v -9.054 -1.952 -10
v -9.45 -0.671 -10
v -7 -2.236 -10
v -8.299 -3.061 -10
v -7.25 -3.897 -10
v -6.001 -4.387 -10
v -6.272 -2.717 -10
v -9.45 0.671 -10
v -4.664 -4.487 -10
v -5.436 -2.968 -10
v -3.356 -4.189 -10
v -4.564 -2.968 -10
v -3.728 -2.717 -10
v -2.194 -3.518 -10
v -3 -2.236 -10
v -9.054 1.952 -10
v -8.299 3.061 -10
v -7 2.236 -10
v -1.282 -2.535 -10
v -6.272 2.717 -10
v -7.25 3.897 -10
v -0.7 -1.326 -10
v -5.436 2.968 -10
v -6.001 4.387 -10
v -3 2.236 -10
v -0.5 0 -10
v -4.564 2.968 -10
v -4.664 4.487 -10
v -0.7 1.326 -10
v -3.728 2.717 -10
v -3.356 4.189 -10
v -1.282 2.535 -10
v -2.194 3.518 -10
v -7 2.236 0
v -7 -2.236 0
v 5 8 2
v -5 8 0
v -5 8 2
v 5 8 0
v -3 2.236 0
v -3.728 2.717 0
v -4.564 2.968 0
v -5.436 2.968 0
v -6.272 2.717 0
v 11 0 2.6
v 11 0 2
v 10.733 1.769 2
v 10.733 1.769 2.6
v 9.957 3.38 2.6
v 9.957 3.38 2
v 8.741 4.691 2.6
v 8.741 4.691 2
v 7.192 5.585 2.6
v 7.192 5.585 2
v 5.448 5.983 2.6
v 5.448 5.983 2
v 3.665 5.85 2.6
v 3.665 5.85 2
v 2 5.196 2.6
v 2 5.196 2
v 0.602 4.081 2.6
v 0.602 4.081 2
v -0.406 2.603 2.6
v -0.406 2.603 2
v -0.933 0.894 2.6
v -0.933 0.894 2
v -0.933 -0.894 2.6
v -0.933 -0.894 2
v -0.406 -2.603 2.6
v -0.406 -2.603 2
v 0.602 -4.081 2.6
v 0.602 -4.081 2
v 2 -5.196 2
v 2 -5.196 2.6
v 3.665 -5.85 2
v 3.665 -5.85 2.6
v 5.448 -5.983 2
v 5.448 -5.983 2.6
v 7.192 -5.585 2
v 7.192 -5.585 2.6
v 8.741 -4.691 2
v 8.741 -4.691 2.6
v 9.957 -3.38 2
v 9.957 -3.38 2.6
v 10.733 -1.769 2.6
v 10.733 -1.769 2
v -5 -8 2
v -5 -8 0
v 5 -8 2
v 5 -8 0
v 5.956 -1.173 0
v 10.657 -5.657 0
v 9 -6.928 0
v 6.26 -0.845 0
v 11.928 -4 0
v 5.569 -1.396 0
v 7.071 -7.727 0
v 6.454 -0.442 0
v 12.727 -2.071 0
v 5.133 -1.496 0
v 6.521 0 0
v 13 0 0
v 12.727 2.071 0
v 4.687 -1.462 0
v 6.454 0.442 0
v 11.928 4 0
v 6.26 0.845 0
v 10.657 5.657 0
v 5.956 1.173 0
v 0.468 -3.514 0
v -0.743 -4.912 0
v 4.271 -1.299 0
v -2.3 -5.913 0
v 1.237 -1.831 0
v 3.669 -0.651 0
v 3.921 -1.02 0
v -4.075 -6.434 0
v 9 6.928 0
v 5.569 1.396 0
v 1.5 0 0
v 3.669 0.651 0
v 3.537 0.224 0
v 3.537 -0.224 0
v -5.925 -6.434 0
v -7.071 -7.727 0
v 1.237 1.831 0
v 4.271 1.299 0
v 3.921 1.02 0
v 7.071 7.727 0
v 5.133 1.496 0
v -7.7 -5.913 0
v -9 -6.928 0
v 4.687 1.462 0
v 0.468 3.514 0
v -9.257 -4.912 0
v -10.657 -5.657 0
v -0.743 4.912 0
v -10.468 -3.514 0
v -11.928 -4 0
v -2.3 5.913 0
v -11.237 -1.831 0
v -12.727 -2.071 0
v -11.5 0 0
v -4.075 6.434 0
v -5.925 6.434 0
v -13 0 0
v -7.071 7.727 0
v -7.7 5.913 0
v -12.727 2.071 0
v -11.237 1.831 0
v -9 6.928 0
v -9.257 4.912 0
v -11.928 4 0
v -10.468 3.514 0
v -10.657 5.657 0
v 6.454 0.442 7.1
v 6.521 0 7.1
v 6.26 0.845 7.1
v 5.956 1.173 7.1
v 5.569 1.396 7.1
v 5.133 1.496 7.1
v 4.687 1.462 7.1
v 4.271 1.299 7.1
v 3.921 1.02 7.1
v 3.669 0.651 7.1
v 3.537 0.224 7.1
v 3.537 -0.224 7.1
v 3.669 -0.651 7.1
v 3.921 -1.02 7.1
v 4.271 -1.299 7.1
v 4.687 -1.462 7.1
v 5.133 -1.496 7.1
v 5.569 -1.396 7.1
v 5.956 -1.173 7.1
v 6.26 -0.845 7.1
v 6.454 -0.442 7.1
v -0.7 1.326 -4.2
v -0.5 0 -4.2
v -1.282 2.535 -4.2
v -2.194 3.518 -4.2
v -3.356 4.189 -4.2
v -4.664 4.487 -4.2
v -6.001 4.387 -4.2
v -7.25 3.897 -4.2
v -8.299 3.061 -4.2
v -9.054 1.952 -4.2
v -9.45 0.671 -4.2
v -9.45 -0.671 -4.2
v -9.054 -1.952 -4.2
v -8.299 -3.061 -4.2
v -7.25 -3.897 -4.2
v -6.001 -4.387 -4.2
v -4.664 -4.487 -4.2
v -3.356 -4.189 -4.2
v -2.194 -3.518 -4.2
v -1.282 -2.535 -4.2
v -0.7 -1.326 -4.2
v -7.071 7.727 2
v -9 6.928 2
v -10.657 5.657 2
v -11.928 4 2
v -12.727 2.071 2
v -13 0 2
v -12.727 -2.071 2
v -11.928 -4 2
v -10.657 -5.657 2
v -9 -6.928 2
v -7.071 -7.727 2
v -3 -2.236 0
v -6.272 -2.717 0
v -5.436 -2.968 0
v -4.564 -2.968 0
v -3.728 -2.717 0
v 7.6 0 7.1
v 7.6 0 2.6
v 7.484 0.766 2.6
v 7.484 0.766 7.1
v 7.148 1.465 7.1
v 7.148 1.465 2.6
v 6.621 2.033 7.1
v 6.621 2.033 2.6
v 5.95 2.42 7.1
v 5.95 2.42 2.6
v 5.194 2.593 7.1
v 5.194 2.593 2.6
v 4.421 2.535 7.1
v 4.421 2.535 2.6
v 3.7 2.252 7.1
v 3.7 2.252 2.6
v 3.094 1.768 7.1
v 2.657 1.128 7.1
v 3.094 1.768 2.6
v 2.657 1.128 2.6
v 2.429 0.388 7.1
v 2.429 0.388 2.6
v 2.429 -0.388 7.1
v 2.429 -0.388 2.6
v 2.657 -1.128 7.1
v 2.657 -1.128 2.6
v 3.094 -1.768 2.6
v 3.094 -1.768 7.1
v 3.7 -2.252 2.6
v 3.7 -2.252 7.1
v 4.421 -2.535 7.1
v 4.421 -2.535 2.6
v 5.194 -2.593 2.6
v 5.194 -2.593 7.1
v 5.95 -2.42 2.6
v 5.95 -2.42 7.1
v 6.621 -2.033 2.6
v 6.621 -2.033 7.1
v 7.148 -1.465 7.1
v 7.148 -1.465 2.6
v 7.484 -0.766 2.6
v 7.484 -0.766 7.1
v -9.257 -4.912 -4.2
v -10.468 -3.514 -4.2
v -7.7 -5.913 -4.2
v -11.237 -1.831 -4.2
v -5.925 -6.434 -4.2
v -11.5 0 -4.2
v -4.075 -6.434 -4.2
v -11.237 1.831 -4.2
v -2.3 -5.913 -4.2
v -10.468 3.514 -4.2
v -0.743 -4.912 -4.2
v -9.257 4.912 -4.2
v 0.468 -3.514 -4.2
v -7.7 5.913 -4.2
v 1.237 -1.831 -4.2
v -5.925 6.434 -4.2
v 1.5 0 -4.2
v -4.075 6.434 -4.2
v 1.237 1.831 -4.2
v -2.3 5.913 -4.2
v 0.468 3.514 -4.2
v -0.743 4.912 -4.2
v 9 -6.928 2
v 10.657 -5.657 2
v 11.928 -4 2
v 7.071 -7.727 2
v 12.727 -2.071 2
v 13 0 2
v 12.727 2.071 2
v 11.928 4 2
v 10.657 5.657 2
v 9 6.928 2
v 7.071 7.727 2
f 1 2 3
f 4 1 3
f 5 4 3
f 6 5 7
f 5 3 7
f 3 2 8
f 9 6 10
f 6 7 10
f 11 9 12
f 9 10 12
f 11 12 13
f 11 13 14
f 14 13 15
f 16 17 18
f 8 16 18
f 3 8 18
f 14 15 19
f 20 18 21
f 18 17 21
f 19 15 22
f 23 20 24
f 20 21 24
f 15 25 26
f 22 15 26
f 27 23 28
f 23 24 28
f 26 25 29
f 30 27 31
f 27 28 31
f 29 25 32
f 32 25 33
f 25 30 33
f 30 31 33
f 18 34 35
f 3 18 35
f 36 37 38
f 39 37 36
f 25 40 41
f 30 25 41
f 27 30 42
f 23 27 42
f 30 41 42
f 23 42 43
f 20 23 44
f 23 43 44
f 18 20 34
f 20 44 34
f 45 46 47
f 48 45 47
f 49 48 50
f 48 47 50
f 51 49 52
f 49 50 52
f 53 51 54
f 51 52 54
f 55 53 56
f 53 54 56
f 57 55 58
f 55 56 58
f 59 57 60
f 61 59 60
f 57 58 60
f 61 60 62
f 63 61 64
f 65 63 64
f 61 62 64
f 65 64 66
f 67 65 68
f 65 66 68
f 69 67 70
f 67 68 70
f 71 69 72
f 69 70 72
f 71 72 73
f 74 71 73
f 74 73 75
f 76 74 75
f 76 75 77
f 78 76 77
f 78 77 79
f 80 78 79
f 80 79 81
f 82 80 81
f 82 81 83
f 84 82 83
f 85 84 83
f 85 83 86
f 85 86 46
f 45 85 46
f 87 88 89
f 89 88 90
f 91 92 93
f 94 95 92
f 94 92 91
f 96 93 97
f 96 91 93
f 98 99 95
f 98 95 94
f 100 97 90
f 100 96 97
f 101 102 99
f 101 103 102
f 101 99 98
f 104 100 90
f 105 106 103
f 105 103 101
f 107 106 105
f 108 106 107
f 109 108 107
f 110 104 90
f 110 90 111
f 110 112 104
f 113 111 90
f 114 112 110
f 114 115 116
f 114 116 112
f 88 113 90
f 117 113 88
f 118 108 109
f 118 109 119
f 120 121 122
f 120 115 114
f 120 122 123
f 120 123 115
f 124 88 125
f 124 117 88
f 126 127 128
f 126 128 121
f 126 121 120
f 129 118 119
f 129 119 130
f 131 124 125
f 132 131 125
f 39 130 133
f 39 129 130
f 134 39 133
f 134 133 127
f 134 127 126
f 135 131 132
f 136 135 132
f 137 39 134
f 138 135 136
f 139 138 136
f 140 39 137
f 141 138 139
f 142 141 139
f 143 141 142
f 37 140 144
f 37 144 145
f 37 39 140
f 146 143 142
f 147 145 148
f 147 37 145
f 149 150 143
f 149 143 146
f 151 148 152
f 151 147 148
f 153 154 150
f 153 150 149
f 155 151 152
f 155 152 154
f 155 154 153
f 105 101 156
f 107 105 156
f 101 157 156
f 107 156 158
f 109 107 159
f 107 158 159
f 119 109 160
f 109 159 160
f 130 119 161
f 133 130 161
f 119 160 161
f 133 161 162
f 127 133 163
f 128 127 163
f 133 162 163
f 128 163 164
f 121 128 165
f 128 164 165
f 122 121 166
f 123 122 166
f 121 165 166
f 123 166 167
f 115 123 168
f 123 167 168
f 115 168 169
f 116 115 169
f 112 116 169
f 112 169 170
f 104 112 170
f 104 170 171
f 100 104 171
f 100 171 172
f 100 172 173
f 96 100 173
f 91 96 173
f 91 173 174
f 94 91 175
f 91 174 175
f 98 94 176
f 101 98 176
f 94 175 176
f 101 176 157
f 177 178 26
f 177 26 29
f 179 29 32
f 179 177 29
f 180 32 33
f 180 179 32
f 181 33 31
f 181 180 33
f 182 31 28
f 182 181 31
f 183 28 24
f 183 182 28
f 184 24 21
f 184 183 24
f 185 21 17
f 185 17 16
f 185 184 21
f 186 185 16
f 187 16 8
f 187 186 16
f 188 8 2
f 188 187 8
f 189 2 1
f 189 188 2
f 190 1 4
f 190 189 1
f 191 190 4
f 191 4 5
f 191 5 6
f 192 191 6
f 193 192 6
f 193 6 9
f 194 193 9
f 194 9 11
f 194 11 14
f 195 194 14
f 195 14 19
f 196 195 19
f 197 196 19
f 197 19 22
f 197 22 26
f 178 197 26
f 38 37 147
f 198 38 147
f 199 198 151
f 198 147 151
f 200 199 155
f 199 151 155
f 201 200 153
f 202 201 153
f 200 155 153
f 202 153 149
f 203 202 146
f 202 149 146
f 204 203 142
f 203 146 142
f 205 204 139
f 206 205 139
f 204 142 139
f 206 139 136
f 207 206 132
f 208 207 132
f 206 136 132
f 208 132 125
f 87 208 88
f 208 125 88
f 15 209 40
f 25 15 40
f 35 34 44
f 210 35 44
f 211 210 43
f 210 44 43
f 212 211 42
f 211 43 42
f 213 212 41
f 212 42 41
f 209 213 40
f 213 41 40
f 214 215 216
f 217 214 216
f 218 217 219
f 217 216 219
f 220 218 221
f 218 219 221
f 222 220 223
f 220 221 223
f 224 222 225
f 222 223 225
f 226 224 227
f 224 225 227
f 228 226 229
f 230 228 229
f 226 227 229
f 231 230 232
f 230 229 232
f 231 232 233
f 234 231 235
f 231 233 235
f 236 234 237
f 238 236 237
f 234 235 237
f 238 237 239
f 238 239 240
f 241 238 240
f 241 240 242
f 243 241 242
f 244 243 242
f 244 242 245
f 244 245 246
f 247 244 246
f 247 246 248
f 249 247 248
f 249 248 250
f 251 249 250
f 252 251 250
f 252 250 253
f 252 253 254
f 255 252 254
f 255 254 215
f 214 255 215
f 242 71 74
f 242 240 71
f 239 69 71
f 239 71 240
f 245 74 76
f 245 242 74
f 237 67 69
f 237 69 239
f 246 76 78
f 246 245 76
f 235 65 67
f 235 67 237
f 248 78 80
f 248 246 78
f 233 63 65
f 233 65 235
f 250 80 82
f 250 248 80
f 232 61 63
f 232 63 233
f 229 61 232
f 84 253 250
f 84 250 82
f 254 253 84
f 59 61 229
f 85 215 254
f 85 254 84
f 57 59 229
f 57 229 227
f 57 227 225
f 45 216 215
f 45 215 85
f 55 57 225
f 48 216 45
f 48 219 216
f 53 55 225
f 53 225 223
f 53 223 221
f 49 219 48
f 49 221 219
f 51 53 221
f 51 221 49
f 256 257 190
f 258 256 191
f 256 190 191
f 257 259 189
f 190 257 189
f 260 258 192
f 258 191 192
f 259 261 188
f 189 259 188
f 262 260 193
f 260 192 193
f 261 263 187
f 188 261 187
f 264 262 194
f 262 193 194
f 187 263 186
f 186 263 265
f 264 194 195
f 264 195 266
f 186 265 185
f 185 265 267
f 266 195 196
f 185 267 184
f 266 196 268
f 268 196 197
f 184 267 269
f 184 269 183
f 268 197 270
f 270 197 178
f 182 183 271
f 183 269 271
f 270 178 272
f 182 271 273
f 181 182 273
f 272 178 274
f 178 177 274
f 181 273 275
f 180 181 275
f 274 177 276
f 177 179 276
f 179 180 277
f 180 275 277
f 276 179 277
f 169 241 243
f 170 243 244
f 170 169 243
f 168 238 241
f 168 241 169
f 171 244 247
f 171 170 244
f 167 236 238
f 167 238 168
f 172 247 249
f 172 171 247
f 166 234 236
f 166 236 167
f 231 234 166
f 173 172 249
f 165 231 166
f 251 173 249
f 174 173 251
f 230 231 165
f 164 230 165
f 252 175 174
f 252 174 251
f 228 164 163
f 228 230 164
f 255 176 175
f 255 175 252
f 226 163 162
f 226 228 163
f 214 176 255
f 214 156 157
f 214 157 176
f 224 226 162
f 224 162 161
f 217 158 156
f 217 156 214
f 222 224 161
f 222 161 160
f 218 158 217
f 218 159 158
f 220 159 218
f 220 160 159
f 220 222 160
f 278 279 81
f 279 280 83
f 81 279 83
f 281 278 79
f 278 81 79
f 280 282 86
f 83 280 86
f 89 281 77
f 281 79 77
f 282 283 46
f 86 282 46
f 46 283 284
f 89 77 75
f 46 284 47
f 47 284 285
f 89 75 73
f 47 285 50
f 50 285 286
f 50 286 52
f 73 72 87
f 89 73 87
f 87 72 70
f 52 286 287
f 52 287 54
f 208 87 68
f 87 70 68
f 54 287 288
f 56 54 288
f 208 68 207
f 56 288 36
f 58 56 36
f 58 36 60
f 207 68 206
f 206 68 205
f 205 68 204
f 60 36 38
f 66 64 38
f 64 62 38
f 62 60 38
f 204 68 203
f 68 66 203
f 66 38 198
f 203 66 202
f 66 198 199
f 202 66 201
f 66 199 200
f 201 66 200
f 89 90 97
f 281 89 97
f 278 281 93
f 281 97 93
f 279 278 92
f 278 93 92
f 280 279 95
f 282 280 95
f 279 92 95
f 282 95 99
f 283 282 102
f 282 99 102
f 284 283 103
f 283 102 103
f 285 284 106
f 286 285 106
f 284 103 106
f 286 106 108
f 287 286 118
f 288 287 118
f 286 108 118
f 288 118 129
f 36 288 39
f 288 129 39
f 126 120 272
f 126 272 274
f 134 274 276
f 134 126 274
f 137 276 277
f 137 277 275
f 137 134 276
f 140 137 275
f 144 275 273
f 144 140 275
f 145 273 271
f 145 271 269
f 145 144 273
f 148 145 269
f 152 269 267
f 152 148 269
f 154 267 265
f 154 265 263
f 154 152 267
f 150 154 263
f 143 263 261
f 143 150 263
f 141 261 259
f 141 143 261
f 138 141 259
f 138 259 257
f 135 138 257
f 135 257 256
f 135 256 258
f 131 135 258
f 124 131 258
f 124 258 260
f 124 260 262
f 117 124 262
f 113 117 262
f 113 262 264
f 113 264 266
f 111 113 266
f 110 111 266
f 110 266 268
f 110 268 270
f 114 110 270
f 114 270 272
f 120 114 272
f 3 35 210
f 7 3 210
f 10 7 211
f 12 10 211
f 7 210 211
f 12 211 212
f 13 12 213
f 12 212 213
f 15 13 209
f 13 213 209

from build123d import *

# Parameters (mm, degrees)
PAD005_DEPTH = 10
SKETCH014_R  = 1.5
PAD013_DEPTH = 10
SKETCH002_R  = 6
PAD001_DEPTH = 2.6
SKETCH003_R  = 2.6
PAD002_DEPTH = 7.1
SKETCH004_R  = 4.5
PAD003_DEPTH = 10
SKETCH005_R  = 6.5
PAD004_DEPTH = 4.2
PAD006_DEPTH = 2


with BuildPart() as motor_linkage_hole_body:
    # Sketch006 → Pad005 (new body)
    with BuildSketch(Plane.XY):
        with BuildLine():
            Line((-7, 2.236068), (-7, -2.236068))
            ThreePointArc((-7, -2.236068), (-5, -3), (-3, -2.236068))
            Line((-3, -2.236068), (-3, 2.236068))
            ThreePointArc((-3, 2.236068), (-5, 3), (-7, 2.236068))
        make_face()
    extrude(amount=-PAD005_DEPTH)


with BuildPart() as hole_fusion:
    # Sketch014 → Pad013 (new body, symmetric)
    with BuildSketch(Plane.XY):
        with Locations((5.020646, 0)):
            Circle(SKETCH014_R)
    extrude(amount=PAD013_DEPTH, both=True)

    # Fusion005: union motor linkage hole body
    add(motor_linkage_hole_body.part)


with BuildPart() as motor_linkage_cut:
    # Sketch002 → Pad001 (new body)
    with BuildSketch(Plane.XY):
        with Locations((5, 0)):
            Circle(SKETCH002_R)
    extrude(amount=PAD001_DEPTH)

    # Sketch003 → Pad002 (join)
    with BuildSketch(Plane.XY):
        with Locations((5, 0)):
            Circle(SKETCH003_R)
    extrude(amount=PAD002_DEPTH)

    # Sketch004 → Pad003 (join)
    with BuildSketch(Plane.XY):
        with Locations((-5, 0)):
            Circle(SKETCH004_R)
    extrude(amount=-PAD003_DEPTH)

    # Sketch005 → Pad004 (join)
    with BuildSketch(Plane.XY):
        with Locations((-5, 0)):
            Circle(SKETCH005_R)
    extrude(amount=-PAD004_DEPTH)

    # Sketch001 → Pad006 (join)
    with BuildSketch(Plane.XY):
        with BuildLine():
            Line((-5, 8), (5, 8))
            ThreePointArc((5, -8), (13, 0), (5, 8))
            Line((-5, -8), (5, -8))
            ThreePointArc((-5, 8), (-13, 0), (-5, -8))
        make_face()
    extrude(amount=PAD006_DEPTH)

    # Cut: cut hole fusion
    add(hole_fusion.part, mode=Mode.SUBTRACT)


solid = motor_linkage_cut.part
